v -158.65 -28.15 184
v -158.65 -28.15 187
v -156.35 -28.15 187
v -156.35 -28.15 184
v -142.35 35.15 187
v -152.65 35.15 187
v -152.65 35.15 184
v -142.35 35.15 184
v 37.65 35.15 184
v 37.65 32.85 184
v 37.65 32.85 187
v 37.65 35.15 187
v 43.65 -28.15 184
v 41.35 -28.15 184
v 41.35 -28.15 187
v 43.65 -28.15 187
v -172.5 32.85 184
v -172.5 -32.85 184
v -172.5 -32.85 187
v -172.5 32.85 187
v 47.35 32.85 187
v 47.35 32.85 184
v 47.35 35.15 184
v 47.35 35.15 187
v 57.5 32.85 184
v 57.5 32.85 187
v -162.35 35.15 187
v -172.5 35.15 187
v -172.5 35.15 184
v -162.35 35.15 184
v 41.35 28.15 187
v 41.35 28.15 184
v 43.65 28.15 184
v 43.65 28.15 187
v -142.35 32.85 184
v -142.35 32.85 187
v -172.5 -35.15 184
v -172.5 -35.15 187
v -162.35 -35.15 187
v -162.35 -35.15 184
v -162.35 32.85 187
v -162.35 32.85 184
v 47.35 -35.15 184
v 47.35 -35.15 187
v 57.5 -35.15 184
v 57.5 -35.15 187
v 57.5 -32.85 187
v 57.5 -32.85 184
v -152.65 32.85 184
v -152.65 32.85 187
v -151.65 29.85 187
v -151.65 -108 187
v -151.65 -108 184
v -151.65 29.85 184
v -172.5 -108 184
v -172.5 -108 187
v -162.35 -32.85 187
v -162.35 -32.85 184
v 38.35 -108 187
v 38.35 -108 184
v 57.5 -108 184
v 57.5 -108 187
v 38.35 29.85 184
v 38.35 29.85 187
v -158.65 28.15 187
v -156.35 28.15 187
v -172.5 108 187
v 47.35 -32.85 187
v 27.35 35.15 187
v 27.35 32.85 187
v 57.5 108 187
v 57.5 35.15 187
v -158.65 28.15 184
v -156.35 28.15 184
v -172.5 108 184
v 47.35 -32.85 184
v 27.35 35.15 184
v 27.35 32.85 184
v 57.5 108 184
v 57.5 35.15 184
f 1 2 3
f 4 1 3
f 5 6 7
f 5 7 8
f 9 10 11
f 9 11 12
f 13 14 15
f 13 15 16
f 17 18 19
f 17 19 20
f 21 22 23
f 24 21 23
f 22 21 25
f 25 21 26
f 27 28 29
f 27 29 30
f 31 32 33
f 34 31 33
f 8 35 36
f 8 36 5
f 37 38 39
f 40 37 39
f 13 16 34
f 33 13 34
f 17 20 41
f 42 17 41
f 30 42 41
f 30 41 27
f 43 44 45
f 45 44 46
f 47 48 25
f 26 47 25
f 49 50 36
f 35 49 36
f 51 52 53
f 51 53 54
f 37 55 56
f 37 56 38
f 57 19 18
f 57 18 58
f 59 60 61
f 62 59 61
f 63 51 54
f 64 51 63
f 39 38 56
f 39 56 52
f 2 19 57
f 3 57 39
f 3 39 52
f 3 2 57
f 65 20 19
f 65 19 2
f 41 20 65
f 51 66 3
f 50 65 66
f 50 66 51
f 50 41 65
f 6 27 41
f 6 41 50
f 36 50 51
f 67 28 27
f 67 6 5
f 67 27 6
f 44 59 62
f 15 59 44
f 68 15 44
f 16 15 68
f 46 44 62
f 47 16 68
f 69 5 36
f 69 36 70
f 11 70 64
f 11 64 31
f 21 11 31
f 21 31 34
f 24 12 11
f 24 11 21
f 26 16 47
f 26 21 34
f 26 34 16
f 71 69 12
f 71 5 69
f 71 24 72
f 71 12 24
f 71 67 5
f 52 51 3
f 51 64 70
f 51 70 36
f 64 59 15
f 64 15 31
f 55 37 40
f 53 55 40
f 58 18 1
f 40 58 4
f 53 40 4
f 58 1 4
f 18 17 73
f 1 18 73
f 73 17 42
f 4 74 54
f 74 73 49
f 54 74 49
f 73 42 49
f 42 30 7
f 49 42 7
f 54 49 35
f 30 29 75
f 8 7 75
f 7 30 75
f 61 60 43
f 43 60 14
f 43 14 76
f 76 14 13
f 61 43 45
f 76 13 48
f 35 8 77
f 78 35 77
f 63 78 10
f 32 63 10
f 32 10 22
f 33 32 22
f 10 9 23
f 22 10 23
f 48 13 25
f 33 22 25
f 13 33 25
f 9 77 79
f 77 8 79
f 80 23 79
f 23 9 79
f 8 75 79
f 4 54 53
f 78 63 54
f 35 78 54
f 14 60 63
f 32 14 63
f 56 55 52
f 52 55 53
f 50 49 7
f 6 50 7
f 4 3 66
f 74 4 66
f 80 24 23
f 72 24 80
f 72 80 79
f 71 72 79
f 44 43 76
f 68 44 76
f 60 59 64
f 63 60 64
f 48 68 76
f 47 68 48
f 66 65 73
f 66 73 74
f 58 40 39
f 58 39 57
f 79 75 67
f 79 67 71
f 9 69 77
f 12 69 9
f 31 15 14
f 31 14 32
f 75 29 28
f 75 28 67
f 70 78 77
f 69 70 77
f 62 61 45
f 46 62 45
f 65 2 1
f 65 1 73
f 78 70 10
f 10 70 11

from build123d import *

# Parameters (mm, degrees)
SKETCH2_W           = 230
SKETCH2_H           = 216
BOSS_EXTRUDE1_DEPTH = 3
SKETCH5_W           = 190
SKETCH5_H           = 137.85
SKETCH5_W_2         = 10.3
SKETCH5_H_2         = 2.3
SKETCH5_W_3         = 2.3
SKETCH5_H_3         = 56.3
CUT_EXTRUDE3_DEPTH  = 3


with BuildPart() as part:
    # Sketch2 → Boss-Extrude1 (new body)
    with BuildSketch(Plane.XY.offset(184)):
        with Locations((-57.5, 0)):
            Rectangle(SKETCH2_W, SKETCH2_H)
    extrude(amount=BOSS_EXTRUDE1_DEPTH)

    # Sketch5 → Cut-Extrude3 (cut)
    with BuildSketch(Plane.XY.offset(187)):
        with Locations((-56.65, -39.075)):
            Rectangle(SKETCH5_W, SKETCH5_H)
        with Locations((32.5, 34)):
            Rectangle(SKETCH5_W_2, SKETCH5_H_2)
        with Locations((52.5, 34)):
            Rectangle(SKETCH5_W_2, SKETCH5_H_2)
        with Locations((42.5, 0)):
            Rectangle(SKETCH5_W_3, SKETCH5_H_3)
        with Locations((52.5, -34)):
            Rectangle(SKETCH5_W_2, SKETCH5_H_2)
        with Locations((-157.5, 0)):
            Rectangle(SKETCH5_W_3, SKETCH5_H_3)
        with Locations((-147.5, 34)):
            Rectangle(SKETCH5_W_2, SKETCH5_H_2)
        with Locations((-167.5, 34)):
            Rectangle(SKETCH5_W_2, SKETCH5_H_2)
        with Locations((-167.5, -34)):
            Rectangle(SKETCH5_W_2, SKETCH5_H_2)
    extrude(amount=-CUT_EXTRUDE3_DEPTH, mode=Mode.SUBTRACT)


solid = part.part
